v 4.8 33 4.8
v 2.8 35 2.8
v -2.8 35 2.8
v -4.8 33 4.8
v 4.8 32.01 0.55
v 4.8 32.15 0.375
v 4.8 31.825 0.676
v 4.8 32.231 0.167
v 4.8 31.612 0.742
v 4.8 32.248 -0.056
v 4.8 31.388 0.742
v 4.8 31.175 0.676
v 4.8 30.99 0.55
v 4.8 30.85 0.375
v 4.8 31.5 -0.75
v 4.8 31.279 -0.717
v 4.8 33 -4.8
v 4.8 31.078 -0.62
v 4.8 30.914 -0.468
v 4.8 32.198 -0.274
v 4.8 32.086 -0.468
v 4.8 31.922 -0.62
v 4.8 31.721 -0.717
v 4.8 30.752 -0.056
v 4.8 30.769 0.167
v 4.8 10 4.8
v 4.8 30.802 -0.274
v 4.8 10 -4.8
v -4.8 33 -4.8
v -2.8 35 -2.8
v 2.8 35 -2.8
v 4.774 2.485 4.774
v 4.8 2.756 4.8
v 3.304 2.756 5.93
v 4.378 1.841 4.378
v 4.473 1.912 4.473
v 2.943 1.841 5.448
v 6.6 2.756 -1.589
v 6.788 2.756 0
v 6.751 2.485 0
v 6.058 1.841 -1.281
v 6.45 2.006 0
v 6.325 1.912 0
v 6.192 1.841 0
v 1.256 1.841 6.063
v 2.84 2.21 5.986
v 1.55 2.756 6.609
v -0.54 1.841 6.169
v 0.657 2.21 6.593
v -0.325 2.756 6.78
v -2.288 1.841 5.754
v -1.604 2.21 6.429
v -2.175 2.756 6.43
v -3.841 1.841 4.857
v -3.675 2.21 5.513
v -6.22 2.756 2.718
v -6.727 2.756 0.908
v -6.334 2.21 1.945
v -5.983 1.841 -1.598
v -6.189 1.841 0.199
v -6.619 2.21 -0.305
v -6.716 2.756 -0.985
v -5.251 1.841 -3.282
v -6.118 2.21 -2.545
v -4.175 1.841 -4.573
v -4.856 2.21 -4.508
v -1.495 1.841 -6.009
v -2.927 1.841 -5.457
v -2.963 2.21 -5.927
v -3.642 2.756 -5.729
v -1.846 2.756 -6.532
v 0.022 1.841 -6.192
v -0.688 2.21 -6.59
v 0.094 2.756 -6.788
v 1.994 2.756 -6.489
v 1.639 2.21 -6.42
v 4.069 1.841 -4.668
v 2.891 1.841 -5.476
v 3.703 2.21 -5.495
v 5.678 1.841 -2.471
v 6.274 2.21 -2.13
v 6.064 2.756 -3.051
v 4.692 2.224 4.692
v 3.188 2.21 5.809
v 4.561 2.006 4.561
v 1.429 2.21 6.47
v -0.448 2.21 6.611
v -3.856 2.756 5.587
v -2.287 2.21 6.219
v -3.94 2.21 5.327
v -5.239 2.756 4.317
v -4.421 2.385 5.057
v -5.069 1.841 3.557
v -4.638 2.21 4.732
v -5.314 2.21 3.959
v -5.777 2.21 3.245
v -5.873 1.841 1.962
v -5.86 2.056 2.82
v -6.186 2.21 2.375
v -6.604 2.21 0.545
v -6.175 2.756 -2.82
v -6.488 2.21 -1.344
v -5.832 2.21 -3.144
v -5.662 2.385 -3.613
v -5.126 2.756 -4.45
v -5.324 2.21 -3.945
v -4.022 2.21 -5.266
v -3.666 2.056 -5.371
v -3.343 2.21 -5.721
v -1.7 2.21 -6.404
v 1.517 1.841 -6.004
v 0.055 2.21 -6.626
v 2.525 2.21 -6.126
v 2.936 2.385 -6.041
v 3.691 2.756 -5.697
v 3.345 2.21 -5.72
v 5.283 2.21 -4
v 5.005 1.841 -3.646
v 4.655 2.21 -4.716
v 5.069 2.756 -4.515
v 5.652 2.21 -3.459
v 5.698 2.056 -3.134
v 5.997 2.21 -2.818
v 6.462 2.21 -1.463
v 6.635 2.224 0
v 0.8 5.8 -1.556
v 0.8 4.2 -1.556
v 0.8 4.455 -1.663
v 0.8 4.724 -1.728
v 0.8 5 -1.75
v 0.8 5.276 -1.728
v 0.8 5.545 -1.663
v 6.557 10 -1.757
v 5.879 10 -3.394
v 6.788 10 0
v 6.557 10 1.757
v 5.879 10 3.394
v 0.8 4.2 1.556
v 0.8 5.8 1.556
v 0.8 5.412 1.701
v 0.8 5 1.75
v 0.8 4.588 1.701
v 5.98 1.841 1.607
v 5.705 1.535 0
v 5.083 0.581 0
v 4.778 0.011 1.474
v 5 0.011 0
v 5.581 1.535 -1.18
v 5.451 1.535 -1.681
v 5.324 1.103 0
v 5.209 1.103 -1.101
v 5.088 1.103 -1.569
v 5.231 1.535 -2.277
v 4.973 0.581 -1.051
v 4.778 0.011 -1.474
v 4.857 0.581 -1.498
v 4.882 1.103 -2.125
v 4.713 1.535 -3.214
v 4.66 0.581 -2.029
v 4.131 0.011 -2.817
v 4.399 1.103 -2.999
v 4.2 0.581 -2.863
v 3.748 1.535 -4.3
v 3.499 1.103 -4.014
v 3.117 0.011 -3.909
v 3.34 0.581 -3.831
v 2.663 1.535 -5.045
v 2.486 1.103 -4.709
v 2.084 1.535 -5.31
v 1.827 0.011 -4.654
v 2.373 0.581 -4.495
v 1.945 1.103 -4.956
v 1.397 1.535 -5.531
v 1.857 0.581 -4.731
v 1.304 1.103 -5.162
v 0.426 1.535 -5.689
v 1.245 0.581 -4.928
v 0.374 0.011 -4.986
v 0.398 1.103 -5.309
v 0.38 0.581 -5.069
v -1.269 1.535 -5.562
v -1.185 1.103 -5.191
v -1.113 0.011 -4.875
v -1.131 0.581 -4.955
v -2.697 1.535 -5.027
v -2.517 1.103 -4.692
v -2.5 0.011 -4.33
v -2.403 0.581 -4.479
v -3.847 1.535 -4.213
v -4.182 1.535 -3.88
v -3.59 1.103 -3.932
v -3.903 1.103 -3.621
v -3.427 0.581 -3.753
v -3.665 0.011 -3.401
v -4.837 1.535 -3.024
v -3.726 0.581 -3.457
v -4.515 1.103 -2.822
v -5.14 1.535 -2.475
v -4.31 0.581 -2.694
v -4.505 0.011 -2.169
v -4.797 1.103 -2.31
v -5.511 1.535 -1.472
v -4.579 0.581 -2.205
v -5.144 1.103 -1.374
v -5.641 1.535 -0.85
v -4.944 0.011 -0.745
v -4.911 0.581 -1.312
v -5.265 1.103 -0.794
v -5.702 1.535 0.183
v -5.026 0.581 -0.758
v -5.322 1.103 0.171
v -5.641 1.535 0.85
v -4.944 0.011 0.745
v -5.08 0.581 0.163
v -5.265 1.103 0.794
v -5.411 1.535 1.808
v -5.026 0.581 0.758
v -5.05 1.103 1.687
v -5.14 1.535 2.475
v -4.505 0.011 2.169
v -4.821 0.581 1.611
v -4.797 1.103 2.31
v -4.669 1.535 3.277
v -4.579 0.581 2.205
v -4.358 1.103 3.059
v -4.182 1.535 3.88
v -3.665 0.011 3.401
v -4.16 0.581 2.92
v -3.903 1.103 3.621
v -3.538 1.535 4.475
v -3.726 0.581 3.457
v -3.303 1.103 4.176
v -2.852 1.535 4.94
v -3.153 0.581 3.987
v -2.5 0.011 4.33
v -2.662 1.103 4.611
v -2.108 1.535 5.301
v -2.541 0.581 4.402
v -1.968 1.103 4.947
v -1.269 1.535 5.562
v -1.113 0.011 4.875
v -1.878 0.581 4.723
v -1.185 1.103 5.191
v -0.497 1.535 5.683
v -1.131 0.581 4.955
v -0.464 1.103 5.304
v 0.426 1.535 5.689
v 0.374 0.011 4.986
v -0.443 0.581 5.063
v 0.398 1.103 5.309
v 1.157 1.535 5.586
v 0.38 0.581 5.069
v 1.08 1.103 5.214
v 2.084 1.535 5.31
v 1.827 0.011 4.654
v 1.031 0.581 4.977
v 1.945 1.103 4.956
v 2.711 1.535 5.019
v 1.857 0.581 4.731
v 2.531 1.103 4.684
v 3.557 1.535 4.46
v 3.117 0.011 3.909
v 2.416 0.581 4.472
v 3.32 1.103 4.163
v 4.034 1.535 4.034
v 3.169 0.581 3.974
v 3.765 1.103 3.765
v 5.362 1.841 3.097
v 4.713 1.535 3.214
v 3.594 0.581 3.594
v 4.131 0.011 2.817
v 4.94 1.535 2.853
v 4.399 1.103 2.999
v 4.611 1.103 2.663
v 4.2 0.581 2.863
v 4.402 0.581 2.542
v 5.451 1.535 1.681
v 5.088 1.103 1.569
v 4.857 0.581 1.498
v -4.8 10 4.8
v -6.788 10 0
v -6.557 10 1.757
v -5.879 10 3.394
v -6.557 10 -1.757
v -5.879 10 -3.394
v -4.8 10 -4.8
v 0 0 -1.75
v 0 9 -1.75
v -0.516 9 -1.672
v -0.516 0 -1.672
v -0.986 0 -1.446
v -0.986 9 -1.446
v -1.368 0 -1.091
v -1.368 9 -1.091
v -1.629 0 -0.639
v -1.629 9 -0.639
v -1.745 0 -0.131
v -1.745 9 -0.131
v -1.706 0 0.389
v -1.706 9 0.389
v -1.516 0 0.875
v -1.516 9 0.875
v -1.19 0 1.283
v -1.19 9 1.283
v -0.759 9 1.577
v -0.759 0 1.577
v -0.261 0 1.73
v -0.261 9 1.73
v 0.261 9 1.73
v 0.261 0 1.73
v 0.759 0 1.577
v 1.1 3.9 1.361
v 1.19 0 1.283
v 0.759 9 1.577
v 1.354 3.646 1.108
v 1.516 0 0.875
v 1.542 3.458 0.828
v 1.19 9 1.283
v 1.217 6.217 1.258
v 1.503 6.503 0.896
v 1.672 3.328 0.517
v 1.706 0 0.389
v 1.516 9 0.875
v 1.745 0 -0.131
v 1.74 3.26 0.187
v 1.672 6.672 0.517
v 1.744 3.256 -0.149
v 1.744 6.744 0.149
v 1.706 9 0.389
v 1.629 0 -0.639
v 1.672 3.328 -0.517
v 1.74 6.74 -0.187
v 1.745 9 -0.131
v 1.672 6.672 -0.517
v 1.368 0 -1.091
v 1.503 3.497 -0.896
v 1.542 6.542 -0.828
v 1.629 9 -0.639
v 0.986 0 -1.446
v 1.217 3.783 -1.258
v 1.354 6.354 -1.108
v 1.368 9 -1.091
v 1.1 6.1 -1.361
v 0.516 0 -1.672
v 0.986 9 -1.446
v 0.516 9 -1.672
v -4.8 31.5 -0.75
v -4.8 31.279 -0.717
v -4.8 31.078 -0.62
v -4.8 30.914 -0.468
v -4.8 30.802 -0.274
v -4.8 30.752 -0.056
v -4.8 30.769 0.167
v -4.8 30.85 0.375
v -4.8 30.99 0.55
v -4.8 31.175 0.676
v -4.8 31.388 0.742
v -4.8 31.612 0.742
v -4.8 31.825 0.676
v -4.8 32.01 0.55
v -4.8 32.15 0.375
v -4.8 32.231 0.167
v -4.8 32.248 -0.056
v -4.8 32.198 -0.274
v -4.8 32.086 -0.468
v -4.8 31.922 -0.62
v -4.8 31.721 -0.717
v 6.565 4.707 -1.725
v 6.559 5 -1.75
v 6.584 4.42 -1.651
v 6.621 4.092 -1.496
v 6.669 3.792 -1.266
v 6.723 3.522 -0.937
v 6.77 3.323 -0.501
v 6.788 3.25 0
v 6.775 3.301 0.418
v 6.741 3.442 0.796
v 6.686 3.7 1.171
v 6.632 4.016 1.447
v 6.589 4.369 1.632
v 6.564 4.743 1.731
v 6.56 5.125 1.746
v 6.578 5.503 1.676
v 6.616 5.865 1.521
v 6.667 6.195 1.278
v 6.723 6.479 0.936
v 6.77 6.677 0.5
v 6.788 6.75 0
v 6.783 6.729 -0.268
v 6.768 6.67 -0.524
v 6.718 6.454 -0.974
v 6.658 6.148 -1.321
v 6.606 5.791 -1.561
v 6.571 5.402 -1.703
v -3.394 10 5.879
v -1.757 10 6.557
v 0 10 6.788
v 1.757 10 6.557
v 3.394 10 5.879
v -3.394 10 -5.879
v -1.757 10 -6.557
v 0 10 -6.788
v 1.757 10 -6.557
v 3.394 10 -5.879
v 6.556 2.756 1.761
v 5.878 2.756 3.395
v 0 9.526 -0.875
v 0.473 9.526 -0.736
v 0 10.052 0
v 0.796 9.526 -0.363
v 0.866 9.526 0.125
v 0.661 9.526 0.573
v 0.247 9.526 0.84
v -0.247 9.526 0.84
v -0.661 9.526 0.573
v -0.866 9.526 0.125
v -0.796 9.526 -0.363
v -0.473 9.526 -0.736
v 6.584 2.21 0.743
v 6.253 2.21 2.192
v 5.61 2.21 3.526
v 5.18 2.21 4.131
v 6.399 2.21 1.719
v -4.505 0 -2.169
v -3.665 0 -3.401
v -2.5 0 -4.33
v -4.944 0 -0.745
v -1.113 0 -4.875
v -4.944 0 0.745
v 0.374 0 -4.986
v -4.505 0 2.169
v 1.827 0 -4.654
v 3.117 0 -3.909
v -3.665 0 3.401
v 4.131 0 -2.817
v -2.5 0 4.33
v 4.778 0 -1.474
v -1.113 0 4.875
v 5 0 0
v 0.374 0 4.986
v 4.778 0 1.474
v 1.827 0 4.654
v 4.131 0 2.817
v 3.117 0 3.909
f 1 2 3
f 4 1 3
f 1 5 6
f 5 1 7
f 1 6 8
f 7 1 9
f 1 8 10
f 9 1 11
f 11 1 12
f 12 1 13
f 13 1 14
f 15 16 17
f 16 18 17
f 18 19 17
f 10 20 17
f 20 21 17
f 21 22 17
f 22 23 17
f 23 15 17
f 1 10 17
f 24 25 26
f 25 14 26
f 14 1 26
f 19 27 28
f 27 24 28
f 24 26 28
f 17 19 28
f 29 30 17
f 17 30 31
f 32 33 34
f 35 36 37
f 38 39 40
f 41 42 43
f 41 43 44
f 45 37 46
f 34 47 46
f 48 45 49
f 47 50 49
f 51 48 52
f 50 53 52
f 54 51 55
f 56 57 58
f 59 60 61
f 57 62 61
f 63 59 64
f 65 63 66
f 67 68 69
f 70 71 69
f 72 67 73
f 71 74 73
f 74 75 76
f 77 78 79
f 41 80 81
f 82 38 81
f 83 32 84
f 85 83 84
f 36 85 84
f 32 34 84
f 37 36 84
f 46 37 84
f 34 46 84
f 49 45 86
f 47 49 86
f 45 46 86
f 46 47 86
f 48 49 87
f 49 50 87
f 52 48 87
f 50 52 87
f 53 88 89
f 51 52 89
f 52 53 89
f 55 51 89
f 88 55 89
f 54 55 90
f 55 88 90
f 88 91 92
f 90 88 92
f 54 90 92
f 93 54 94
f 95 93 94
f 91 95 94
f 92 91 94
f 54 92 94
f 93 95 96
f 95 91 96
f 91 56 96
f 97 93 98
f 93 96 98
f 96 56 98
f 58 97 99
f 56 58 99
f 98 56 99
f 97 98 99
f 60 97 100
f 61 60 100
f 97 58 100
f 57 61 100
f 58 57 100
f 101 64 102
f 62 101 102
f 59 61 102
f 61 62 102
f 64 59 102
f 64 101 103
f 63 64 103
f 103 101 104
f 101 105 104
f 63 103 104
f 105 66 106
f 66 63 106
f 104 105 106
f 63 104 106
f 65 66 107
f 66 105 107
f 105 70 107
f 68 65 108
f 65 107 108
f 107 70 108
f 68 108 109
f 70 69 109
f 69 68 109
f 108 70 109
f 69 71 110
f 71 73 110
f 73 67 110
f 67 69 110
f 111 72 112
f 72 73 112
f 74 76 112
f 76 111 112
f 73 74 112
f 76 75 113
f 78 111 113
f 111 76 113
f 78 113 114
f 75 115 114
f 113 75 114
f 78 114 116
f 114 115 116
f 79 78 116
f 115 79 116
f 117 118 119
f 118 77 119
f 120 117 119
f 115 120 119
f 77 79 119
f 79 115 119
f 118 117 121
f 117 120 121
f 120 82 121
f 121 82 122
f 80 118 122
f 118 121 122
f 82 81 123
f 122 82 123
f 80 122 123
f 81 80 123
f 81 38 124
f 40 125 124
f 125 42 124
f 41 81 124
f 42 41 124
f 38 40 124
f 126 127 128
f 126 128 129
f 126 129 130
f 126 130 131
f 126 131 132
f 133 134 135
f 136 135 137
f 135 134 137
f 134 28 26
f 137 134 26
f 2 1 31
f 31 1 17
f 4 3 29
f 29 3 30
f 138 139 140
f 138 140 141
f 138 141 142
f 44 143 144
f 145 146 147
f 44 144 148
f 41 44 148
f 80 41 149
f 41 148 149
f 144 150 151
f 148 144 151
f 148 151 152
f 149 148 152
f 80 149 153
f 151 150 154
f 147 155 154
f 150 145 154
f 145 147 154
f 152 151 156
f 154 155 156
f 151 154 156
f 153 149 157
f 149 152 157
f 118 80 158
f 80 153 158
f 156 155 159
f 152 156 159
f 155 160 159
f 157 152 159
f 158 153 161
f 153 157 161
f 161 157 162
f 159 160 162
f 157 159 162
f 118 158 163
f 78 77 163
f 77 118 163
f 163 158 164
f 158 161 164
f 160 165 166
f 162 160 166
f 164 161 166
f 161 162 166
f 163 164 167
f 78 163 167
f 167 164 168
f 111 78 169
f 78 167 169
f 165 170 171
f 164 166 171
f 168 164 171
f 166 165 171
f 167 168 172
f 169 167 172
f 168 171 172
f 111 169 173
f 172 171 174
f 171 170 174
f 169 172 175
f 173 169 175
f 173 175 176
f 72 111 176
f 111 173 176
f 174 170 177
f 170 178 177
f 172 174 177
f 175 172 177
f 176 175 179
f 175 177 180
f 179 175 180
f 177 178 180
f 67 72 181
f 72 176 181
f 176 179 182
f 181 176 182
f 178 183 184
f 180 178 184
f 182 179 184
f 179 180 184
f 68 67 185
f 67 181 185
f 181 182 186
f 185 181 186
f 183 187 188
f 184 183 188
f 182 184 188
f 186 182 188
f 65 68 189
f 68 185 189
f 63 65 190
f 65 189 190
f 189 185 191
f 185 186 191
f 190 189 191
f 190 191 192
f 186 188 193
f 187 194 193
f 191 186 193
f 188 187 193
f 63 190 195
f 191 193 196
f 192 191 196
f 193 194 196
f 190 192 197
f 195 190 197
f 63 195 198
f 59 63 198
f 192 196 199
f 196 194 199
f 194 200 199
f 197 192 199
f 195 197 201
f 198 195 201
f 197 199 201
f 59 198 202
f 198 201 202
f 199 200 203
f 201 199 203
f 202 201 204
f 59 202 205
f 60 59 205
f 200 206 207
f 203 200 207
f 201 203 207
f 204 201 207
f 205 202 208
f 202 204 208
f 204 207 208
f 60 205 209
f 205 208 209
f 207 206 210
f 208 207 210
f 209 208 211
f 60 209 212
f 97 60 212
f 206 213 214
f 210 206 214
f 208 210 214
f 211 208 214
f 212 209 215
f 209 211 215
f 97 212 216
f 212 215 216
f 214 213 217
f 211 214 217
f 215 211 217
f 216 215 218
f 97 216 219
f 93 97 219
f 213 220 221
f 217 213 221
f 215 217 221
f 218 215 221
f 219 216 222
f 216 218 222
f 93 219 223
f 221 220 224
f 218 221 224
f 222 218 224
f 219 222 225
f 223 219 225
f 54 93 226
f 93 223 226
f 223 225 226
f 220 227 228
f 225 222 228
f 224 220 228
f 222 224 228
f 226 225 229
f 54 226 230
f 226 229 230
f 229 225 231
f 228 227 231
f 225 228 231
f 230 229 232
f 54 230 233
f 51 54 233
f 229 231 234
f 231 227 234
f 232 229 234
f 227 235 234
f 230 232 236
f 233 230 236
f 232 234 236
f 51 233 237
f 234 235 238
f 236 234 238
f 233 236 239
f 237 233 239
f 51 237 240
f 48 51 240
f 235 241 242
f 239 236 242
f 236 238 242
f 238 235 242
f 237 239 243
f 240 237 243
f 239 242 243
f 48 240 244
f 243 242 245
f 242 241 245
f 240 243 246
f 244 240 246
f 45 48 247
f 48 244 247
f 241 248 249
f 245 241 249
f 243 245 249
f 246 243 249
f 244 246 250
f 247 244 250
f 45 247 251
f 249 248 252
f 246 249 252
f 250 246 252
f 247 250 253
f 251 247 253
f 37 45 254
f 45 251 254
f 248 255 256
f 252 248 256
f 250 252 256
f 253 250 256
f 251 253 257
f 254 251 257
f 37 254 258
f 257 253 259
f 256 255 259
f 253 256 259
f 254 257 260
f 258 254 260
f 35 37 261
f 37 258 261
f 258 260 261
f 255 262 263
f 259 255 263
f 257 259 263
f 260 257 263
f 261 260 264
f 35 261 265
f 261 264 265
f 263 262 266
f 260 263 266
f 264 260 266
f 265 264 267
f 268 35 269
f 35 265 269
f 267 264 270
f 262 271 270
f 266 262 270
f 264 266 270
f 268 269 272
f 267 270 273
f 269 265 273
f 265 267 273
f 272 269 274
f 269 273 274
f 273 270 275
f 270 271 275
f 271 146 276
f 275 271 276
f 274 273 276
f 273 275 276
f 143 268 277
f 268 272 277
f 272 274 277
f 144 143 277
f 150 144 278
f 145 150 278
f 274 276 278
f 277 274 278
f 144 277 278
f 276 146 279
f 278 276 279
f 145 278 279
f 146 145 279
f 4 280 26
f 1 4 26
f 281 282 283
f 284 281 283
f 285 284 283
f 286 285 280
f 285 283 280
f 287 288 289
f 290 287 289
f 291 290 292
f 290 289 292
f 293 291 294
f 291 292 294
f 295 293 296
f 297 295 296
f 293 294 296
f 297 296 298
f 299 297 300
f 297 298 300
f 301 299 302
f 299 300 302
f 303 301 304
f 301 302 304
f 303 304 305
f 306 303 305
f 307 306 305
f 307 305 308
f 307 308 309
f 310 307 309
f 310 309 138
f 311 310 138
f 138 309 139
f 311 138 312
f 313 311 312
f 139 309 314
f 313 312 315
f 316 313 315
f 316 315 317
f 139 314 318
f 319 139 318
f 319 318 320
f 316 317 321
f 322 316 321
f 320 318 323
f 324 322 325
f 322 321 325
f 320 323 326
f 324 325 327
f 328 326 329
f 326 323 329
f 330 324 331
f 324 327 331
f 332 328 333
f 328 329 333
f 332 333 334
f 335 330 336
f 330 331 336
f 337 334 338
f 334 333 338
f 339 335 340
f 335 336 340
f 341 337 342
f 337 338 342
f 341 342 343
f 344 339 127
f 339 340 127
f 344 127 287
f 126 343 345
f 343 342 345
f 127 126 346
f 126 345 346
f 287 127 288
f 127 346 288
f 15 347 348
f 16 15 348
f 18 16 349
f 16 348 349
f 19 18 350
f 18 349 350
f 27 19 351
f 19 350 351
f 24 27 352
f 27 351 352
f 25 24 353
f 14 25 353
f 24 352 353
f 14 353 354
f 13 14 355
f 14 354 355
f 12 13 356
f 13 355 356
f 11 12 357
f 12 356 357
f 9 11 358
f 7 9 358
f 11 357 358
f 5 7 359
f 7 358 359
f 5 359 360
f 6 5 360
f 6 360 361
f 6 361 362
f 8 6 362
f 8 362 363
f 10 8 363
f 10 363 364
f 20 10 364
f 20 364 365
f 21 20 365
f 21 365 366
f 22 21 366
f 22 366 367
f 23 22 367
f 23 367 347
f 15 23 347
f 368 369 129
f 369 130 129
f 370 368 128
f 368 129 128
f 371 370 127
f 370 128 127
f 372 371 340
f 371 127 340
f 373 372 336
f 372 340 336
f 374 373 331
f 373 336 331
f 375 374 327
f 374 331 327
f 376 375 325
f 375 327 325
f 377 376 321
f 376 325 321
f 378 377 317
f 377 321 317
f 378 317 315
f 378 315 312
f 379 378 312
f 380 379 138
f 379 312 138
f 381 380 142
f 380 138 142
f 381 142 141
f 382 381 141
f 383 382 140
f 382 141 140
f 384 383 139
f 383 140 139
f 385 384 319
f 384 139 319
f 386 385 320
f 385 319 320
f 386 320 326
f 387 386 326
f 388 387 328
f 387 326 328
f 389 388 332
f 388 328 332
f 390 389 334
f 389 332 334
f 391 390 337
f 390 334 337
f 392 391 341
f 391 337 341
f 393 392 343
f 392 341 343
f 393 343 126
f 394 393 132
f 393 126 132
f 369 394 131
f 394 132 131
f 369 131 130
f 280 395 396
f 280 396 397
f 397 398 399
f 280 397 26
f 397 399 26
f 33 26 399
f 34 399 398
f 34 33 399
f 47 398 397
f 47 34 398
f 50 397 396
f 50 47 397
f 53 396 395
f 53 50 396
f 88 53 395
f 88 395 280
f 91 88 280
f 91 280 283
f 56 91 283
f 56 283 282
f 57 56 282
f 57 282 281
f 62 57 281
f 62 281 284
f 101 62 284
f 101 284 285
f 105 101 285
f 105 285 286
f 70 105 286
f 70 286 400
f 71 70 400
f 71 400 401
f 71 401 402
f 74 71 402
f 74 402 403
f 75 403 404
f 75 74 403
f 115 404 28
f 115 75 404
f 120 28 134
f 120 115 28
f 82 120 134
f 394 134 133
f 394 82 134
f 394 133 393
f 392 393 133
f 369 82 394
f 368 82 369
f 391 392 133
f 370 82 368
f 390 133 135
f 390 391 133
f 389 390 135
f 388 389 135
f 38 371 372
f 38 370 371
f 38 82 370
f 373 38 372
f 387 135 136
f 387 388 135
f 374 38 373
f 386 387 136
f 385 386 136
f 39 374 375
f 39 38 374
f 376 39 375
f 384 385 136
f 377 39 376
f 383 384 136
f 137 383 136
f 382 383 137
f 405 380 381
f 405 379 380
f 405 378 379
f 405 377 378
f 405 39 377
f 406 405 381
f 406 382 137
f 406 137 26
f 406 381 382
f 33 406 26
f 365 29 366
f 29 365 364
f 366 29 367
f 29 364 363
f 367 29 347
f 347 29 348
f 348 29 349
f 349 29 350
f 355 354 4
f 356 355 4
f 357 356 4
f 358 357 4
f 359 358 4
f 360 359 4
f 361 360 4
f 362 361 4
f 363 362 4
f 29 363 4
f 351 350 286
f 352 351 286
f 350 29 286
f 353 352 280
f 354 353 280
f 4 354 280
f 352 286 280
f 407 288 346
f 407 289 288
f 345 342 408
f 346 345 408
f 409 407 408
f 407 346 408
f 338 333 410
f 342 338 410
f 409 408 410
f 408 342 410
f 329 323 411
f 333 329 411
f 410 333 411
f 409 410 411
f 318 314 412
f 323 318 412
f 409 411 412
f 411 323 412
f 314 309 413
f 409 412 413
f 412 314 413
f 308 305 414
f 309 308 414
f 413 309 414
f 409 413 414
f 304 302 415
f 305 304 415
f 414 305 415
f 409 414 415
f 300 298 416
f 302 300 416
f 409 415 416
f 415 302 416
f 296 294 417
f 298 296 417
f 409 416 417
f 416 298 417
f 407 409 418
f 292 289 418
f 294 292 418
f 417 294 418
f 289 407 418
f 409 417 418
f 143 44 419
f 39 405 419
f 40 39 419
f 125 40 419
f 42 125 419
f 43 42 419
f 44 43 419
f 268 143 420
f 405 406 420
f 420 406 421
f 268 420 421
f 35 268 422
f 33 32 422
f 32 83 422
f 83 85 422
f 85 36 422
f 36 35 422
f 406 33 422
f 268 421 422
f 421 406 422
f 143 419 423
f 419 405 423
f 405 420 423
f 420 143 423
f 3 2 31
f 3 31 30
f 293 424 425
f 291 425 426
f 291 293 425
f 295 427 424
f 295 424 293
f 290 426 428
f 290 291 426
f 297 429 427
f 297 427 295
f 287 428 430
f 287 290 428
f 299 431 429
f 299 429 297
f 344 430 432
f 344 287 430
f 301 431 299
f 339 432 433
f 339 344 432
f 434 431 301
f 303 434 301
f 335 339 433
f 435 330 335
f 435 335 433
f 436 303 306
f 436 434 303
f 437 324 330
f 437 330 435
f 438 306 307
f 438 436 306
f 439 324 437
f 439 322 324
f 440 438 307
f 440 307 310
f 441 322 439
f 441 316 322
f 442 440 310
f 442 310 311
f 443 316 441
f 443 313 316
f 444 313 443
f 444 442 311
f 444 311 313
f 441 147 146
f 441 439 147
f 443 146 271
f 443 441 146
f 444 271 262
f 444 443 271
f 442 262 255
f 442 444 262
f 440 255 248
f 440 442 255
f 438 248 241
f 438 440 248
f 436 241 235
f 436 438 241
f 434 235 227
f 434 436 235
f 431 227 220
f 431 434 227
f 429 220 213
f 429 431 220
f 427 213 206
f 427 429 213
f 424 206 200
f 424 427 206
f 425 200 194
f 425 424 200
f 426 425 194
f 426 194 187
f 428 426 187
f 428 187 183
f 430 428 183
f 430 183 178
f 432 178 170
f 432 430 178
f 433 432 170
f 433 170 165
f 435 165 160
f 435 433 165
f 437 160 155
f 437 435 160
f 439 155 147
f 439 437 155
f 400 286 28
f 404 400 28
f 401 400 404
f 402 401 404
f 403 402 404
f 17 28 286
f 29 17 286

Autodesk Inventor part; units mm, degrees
ref_plane "YZ Plane" through (0, 0, 0) normal (1, 0, 0) x (0, 1, 0)
ref_plane "XZ Plane" through (0, 0, 0) normal (0, 1, 0) x (-1, 0, 0)
ref_plane "XY Plane" through (0, 0, 0) normal (0, 0, 1) x (1, 0, 0)
sketch "Sketch1" plane through (0, 0, 0) normal (0, 1, 0) x (-1, 0, 0)
  line L0 (4.8, 4.8) -> (-4.8, 4.8)
  line L1 (-4.8, 4.8) -> (-4.8, -4.8)
  line L2 (-4.8, -4.8) -> (4.8, -4.8)
  line L3 (4.8, -4.8) -> (4.8, 4.8)
  point P0 (0, 0)
  point P1 (4.8, 0)
  point P2 (0, -4.8)
  dimension "d0" = 9.6
  dimension "d1" = 9.6
extrude "Extrusion1" add sketch "Sketch1" along normal blind 35
sketch "Sketch5" plane through (0, 0, 0) normal (0, -1, 0) x (1, 0, 0)
  circle A0 centre (0, 0) radius 1.75
  line L0 (4.8, 4.8) -> (4.8, -4.8) projected
  line L1 (-4.8, 4.8) -> (4.8, 4.8) projected
  line L2 (4.8, -4.8) -> (-4.8, -4.8) projected
  line L3 (4.8, 4.8) -> (-4.8, 4.8)
  line L4 (-4.8, 4.8) -> (-4.8, -4.8)
  line L5 (-4.8, -4.8) -> (4.8, -4.8)
  line L6 (4.8, -4.8) -> (4.8, 4.8)
  circle A1 centre (0, 0) radius 6.7882
  point P0 (-4.8, 4.8)
  point P1 (-4.8, 4.8)
  point P2 (-4.8, 4.8)
  dimension "d14" = 3.5
extrude "Extrusion5" add sketch "Sketch5" against normal blind 10 contours A1 L0 | L1 A1 | A1 L2 | L4 A1
sketch "Sketch6" plane through (4.8, 35, 4.8) normal (1, 0, 0) x (0, 0, -1)
  line L0 (0, 0) -> (9.6, 0) projected
  point P0 (4.8, -35)
  point P1 (4.8, -3.5)
  point P2 (4.8, 0)
  dimension "d18" = 3.5
hole "Hole1" at (4.8, 31.5, 0) direction (-1, 0, 0) diameter 1.5 end through all
sketch "Sketch9" plane through (4.8, 35, 4.8) normal (1, 0, 0) x (0, 0, -1)
  circle A0 centre (4.8, -30) radius 1.75
  point P0 (4.8, -35)
  dimension "d41" = 5
  dimension "d42" = 3.5
extrude "Extrusion7" cut sketch "Sketch9" along normal blind 5 and the other way blind 4
sketch "Sketch10" plane through (0, 0, 0) normal (0, -1, 0) x (1, 0, 0)
  point P0 (0, 0)
  point P1 (0, 0)
hole "Hole3" at (0, 0, 0) direction (0, 1, 0) diameter 3.5 depth 9 tip angle 118
sketch "Sketch11" plane through (0, 0, 0) normal (0, -1, 0) x (1, 0, 0)
  circle A0 centre (0, 0) radius 5
  circle A1 centre (0, 0) radius 7.5
  dimension "d55" = 10
  dimension "d63" = 15
extrude "Extrusion8" cut sketch "Sketch11" against normal blind 2
fillet "Fillet3" radius 2 1 edges at (-5, 2, 0)
chamfer "Chamfer1" distance 2 angle 45 4 edges at (-4.8, 35, 0) (0, 35, -4.8) (4.8, 35, 0) (0, 35, 4.8)
fillet "Fillet5" radius 1 2 edges at (6.2715, 2, -2.5977) (-6.2715, 2, 2.5977)
properties part number "wheel-lockV2"
